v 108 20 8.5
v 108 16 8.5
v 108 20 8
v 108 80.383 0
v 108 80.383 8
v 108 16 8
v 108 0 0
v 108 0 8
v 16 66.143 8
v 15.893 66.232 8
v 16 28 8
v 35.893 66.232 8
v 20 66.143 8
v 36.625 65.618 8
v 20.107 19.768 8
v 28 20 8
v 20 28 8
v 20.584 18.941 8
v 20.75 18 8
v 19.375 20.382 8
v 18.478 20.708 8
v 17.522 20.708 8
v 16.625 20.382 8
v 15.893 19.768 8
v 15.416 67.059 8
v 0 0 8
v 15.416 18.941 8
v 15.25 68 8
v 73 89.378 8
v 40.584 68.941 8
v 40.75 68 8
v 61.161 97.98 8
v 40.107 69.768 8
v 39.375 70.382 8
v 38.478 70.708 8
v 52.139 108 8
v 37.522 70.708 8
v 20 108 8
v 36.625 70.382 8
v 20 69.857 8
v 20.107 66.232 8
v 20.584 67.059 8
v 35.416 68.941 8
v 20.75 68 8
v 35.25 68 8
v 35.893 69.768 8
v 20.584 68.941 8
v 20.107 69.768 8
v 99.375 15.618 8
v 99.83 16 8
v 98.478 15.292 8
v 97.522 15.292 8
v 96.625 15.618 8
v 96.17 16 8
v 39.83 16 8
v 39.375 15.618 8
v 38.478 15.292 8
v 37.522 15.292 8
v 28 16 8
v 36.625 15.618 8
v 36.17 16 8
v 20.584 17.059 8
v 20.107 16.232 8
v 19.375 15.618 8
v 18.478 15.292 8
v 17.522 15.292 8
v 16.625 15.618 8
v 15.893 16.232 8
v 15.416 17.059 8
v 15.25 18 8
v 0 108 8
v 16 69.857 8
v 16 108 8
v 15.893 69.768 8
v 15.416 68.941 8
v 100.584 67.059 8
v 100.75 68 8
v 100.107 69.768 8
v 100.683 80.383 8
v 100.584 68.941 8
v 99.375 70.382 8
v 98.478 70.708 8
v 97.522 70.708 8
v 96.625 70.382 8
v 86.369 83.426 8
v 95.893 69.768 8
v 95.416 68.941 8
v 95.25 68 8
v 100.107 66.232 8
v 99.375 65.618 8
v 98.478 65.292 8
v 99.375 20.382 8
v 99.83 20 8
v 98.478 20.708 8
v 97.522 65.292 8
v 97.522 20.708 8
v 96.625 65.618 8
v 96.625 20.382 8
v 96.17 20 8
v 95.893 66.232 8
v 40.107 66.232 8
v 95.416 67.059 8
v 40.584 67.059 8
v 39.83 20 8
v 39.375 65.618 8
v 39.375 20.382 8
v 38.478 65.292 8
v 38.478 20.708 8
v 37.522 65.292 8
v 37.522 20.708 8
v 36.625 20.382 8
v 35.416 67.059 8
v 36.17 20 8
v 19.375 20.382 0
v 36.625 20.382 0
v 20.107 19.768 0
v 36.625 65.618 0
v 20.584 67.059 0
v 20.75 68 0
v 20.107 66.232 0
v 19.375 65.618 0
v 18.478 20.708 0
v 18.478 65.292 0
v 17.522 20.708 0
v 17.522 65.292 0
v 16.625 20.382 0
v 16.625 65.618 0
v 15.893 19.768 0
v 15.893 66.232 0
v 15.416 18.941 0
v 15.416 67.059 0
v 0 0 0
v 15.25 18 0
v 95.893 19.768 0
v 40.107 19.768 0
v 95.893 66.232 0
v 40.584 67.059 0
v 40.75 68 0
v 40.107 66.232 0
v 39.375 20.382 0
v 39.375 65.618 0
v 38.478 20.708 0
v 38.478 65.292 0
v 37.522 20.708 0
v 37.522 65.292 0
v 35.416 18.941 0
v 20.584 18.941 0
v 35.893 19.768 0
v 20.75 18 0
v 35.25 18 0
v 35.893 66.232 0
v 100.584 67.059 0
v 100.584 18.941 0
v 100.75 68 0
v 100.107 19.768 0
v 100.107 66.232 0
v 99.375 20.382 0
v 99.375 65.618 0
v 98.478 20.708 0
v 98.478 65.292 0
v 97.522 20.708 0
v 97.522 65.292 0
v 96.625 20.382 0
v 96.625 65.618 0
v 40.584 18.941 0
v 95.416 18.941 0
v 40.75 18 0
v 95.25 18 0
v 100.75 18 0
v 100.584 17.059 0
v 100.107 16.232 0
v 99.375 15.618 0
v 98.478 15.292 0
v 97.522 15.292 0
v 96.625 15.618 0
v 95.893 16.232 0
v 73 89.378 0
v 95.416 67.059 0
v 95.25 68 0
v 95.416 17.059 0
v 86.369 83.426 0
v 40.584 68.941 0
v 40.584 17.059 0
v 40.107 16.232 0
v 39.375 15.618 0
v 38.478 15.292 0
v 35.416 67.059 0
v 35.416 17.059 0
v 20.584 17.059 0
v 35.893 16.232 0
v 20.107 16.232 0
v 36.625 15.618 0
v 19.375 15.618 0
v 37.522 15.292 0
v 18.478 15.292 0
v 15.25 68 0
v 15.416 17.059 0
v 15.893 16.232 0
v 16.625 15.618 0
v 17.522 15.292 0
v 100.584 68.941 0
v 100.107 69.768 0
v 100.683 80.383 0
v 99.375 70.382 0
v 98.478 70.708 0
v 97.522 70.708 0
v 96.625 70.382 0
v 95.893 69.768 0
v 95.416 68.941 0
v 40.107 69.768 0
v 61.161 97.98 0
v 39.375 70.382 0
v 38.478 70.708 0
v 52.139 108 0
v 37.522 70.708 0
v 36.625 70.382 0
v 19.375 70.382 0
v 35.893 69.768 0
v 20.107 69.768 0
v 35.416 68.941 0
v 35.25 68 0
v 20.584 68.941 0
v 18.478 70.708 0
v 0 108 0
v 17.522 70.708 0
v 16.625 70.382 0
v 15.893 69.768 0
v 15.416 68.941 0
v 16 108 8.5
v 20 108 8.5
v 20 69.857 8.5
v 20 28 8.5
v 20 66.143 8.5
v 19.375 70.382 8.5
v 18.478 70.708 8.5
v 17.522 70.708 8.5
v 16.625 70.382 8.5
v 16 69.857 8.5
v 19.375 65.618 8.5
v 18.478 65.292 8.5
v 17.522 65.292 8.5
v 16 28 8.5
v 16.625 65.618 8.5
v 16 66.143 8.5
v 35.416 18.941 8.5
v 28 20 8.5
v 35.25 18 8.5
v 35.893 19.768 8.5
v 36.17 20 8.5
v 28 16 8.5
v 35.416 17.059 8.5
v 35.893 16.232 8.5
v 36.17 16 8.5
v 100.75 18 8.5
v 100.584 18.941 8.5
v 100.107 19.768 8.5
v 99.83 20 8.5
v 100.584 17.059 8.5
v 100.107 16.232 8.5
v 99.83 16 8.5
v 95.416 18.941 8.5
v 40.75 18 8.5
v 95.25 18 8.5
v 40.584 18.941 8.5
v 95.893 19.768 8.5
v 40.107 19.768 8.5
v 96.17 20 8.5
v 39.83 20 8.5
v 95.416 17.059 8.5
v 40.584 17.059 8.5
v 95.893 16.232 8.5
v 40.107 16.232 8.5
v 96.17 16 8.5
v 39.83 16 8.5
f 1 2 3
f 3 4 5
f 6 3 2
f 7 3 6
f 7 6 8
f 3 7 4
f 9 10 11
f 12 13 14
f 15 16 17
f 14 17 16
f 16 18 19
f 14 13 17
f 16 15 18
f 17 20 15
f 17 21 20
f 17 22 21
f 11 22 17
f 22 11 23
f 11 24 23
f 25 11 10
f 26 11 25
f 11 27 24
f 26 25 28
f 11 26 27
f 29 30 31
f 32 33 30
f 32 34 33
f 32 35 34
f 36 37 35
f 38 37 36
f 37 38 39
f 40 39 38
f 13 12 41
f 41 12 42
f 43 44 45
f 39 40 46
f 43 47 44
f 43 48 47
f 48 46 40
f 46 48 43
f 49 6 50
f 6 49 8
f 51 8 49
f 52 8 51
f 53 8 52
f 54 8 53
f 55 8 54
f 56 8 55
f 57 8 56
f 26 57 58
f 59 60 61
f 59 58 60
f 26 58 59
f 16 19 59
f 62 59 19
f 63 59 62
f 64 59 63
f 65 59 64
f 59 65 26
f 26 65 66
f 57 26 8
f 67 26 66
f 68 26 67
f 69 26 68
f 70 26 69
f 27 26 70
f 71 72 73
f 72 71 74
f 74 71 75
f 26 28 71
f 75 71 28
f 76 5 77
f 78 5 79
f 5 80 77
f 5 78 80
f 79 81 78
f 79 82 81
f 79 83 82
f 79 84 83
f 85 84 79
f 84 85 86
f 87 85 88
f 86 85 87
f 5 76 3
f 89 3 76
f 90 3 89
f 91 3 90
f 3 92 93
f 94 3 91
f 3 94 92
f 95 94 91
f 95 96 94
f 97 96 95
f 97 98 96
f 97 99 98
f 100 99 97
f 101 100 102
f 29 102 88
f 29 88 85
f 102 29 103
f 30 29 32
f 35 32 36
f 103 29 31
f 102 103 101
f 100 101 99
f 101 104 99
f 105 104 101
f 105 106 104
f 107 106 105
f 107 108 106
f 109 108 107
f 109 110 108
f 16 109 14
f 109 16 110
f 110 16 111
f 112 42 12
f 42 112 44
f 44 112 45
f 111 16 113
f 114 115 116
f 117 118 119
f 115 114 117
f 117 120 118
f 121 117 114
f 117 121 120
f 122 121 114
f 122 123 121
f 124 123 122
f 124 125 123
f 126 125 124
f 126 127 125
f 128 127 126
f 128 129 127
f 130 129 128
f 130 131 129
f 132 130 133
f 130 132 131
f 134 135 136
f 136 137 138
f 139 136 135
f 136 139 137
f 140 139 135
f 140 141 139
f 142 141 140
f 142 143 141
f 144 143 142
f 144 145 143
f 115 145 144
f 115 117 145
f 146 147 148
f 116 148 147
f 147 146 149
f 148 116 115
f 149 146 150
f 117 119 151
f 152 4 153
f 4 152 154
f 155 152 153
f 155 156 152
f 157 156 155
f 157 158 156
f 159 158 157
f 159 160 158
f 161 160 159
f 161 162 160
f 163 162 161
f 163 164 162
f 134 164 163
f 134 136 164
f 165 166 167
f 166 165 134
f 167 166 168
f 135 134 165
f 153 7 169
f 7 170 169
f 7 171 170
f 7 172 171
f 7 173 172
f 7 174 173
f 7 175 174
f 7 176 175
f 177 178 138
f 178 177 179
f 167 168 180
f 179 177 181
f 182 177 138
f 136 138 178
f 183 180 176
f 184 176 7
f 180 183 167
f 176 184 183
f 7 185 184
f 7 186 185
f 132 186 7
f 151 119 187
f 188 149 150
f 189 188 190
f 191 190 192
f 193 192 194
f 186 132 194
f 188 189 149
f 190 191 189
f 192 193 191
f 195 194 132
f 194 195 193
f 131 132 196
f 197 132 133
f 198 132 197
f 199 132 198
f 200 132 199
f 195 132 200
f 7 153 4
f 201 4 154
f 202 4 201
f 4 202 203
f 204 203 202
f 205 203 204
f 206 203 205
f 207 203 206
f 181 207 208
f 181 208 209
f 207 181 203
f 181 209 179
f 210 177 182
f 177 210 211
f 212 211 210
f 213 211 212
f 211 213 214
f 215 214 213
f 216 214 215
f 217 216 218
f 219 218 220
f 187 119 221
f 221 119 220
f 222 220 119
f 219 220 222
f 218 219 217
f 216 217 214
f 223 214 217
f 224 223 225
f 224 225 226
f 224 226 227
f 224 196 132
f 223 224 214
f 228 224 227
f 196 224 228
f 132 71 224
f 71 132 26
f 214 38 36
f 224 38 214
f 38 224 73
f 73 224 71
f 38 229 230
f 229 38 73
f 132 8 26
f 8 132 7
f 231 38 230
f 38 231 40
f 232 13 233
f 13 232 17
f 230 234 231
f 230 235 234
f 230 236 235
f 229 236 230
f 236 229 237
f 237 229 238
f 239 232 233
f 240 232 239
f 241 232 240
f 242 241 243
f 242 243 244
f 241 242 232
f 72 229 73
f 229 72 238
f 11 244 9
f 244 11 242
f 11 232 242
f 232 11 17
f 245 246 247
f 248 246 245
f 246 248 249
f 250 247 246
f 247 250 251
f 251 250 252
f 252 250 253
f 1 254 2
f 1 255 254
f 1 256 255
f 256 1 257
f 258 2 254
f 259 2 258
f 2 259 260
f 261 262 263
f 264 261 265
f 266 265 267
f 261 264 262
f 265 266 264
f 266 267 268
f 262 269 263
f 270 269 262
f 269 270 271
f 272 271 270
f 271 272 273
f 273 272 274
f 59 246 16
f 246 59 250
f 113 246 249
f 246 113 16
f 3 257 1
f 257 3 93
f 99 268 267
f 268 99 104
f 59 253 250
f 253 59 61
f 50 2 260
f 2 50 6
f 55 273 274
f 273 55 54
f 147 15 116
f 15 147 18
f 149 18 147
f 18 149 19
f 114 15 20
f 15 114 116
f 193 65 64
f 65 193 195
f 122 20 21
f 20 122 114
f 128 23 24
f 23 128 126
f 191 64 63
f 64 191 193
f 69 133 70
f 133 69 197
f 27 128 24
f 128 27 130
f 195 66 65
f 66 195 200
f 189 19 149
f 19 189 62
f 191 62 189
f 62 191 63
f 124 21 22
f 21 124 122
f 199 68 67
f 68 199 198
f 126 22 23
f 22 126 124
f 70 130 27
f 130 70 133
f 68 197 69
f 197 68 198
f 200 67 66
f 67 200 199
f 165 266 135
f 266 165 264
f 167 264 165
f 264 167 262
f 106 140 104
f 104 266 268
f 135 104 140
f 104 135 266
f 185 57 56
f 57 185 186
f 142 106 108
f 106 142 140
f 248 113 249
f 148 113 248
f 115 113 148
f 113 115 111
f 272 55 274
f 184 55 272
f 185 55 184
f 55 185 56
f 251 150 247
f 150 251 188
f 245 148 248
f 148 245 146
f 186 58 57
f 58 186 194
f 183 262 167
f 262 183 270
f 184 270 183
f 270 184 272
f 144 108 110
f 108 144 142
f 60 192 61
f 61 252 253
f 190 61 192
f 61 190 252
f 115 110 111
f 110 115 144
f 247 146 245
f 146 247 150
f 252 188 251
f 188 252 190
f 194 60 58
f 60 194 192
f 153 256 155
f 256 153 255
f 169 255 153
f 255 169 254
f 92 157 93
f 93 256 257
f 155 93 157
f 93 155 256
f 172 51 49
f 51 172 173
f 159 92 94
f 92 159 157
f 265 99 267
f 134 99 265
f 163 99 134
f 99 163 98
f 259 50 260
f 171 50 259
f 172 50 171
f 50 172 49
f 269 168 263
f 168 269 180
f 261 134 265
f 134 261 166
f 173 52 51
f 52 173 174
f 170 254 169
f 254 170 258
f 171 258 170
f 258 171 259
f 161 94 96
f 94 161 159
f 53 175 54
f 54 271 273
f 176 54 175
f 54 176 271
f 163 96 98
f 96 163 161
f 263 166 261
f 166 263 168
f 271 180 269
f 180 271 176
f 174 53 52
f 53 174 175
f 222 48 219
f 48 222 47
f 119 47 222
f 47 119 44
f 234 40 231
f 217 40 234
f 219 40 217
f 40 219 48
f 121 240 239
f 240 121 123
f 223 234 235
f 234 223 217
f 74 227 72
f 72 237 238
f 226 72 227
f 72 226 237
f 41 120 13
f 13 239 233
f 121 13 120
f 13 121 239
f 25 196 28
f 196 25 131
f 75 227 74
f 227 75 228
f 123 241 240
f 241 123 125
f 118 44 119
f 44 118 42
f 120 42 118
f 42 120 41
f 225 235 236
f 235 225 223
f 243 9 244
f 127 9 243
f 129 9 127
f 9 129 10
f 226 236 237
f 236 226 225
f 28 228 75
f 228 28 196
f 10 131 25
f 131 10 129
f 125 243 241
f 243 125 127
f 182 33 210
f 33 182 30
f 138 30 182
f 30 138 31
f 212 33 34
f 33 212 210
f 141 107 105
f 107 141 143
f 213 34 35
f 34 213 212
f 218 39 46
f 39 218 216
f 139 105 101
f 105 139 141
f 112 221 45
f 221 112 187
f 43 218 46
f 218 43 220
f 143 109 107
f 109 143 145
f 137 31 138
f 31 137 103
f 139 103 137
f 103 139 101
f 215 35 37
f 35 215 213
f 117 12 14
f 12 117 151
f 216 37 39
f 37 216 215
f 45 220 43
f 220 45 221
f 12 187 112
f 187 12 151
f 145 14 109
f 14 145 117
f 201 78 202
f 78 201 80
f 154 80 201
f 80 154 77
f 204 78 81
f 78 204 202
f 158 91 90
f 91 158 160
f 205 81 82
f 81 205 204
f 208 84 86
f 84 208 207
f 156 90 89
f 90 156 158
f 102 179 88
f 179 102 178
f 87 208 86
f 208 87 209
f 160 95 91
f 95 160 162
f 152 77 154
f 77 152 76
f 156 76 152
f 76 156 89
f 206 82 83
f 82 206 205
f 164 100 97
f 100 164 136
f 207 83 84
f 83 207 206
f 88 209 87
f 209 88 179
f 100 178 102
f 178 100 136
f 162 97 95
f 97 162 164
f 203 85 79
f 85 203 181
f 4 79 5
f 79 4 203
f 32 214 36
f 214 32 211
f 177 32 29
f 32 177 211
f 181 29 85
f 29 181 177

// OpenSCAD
offsetx =8;
offsety  =8;
width_ridge=4;
height = 150;
width = 100+offsetx;
barwidth = 20;
thickness=8;
spacing_bars = 50;
largeCircle = 70.0;
holeSize=5.5;

holes = [
	[barwidth /2,barwidth /2],
	[barwidth+barwidth/2,barwidth /2],
	[width-offsetx-barwidth/2,barwidth /2],

	[barwidth /2,barwidth /2+spacing_bars],
	[barwidth+barwidth/2,barwidth /2+spacing_bars],
	[width-offsetx-barwidth/2,barwidth /2+spacing_bars],

	[barwidth /2,height-barwidth /2],
];



difference() {
union() {

cube([width,width,thickness],false);

translate([offsetx+barwidth/2-width_ridge/2 ,offsety+ barwidth,0.5]) {
	cube([width_ridge,width - barwidth - offsety,thickness],false);
}

translate([offsetx + barwidth,offsety+barwidth/2-width_ridge/2,0.5]) {
	cube([width - barwidth - offsetx,width_ridge,thickness],false);
}


}

translate([0,0,-0.1]) {

	translate([width,height,0]) {
		cylinder(h=thickness+2,r=largeCircle, center = false, $fs=6);
	}

	for(i = holes) {
		translate([offsetx + i[0],offsety + i[1],0])
			cylinder(h=thickness+2,r=holeSize/2, center = false, $fs=1);
	}
	
}


}
